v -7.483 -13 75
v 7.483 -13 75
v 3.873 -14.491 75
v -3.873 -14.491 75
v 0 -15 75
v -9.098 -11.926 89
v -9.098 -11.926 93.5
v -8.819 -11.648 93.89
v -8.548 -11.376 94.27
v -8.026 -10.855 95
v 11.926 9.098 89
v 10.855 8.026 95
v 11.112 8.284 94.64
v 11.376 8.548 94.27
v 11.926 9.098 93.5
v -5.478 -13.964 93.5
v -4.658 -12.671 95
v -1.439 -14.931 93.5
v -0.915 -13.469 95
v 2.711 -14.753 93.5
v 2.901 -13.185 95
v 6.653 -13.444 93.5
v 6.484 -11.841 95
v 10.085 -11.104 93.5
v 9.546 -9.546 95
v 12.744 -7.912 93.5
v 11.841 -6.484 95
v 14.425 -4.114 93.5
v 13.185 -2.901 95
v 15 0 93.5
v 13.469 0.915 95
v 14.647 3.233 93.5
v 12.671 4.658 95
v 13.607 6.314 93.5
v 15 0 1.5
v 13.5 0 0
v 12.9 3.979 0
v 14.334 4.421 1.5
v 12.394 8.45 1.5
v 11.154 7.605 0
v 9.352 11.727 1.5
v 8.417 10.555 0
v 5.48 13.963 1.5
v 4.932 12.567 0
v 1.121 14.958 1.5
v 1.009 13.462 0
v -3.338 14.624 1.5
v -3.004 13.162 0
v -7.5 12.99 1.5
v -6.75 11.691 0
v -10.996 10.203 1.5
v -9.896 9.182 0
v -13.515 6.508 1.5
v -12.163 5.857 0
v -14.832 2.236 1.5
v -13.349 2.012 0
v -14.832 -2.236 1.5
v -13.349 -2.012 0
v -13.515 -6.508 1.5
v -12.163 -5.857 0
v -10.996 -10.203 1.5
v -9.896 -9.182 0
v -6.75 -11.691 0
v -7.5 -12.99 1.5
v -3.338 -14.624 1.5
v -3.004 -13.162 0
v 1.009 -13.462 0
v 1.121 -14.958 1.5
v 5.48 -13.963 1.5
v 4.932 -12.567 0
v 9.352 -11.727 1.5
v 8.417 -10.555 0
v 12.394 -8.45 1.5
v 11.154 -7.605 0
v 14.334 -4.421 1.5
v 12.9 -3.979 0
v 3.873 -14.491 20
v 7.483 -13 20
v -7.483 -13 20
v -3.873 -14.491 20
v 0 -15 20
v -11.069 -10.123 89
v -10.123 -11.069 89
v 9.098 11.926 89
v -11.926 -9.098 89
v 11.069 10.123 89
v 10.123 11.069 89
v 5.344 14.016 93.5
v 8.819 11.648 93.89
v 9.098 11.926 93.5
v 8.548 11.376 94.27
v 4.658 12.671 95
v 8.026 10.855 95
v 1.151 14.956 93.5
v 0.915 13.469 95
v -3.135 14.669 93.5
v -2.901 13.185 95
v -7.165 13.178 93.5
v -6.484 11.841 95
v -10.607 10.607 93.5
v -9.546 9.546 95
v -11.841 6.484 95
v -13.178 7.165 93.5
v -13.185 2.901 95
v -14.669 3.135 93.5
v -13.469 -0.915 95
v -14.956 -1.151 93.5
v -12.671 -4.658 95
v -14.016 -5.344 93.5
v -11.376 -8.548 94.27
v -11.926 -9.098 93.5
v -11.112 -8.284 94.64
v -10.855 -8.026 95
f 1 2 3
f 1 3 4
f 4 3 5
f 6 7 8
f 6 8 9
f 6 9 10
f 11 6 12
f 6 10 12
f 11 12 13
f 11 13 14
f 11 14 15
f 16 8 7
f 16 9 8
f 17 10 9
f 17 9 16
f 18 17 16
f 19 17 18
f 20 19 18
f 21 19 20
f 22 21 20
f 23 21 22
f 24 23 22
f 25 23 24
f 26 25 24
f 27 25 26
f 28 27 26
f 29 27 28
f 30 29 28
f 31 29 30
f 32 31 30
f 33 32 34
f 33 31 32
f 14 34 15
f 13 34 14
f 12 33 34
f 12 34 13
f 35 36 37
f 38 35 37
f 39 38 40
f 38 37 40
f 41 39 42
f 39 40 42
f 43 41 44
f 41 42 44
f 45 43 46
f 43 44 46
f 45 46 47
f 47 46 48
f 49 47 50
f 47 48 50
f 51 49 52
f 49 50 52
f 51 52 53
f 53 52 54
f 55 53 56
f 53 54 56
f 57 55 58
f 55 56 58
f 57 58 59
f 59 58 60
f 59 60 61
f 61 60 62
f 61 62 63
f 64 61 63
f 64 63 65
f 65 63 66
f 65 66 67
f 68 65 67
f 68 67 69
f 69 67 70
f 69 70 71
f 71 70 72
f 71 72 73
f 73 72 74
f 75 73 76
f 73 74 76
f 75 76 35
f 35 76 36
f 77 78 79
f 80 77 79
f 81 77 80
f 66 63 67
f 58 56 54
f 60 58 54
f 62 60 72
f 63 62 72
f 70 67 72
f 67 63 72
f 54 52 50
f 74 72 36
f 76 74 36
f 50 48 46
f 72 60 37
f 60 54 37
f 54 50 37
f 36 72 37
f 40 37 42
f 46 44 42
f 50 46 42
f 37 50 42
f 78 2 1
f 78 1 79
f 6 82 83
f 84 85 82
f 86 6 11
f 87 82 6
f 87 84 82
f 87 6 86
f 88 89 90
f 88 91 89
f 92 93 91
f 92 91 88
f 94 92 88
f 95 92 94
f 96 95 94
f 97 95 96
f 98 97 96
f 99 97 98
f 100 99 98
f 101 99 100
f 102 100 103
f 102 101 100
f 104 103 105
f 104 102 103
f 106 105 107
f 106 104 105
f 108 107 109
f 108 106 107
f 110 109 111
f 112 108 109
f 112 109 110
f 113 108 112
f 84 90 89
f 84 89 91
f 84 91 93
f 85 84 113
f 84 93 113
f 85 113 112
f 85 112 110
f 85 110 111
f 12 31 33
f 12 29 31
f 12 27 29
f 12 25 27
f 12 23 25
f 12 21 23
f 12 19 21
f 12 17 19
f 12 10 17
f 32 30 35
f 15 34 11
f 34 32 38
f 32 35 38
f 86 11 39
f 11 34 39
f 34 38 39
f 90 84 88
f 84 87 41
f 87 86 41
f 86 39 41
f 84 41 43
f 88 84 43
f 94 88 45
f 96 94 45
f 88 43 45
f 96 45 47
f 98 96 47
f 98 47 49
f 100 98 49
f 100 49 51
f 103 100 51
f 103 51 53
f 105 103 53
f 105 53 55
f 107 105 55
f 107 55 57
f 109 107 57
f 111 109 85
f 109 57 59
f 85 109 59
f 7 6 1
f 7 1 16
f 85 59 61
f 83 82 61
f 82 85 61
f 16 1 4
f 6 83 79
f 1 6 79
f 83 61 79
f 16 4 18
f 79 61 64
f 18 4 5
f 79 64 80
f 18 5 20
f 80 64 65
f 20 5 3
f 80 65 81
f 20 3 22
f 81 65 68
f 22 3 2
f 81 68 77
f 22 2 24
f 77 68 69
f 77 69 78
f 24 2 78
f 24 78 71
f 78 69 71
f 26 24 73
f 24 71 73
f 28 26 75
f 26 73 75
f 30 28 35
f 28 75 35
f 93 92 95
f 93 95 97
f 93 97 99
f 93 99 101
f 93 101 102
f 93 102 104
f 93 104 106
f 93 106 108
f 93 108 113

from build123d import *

# Parameters (mm, degrees)
ESQUISSE1_R          = 15
BASE_EXTRUSION_DEPTH = 95
CHANFREIN1_SIZE      = 1.5
ESQUISSE2_W          = 55
ESQUISSE2_H          = 5
M_PLAT_DEPTH         = 101.747208398
RAINURE_DEPTH        = 6


with BuildPart() as part:
    # Esquisse1 → Base-Extrusion (new body)
    with BuildSketch(Plane.XY):
        Circle(ESQUISSE1_R)
    extrude(amount=BASE_EXTRUSION_DEPTH)

    # Chanfrein1
    chanfrein1_edges = [part.edges().sort_by_distance(p)[0] for p in [
        (-15, 0, 0),
        (-15, 0, 95),
    ]]
    chamfer(chanfrein1_edges, length=CHANFREIN1_SIZE)

    # Esquisse2 → Méplat (cut, through all)
    with BuildSketch(Plane(origin=(15, 0, 0), x_dir=(0, 0, -1), z_dir=(1, 0, 0))):
        with Locations((-47.5, -15.5)):
            Rectangle(ESQUISSE2_W, ESQUISSE2_H)
    extrude(amount=-M_PLAT_DEPTH, mode=Mode.SUBTRACT)

    # Esquisse3 → Rainure (cut)
    with BuildSketch(Plane.XY.offset(95)):
        Polygon((-10.960155108, -13.788582233), (13.788582233, 10.960155108), (10.960155108, 13.788582233), (-13.788582233, -10.960155108), align=None)
    extrude(amount=-RAINURE_DEPTH, mode=Mode.SUBTRACT)


solid = part.part
